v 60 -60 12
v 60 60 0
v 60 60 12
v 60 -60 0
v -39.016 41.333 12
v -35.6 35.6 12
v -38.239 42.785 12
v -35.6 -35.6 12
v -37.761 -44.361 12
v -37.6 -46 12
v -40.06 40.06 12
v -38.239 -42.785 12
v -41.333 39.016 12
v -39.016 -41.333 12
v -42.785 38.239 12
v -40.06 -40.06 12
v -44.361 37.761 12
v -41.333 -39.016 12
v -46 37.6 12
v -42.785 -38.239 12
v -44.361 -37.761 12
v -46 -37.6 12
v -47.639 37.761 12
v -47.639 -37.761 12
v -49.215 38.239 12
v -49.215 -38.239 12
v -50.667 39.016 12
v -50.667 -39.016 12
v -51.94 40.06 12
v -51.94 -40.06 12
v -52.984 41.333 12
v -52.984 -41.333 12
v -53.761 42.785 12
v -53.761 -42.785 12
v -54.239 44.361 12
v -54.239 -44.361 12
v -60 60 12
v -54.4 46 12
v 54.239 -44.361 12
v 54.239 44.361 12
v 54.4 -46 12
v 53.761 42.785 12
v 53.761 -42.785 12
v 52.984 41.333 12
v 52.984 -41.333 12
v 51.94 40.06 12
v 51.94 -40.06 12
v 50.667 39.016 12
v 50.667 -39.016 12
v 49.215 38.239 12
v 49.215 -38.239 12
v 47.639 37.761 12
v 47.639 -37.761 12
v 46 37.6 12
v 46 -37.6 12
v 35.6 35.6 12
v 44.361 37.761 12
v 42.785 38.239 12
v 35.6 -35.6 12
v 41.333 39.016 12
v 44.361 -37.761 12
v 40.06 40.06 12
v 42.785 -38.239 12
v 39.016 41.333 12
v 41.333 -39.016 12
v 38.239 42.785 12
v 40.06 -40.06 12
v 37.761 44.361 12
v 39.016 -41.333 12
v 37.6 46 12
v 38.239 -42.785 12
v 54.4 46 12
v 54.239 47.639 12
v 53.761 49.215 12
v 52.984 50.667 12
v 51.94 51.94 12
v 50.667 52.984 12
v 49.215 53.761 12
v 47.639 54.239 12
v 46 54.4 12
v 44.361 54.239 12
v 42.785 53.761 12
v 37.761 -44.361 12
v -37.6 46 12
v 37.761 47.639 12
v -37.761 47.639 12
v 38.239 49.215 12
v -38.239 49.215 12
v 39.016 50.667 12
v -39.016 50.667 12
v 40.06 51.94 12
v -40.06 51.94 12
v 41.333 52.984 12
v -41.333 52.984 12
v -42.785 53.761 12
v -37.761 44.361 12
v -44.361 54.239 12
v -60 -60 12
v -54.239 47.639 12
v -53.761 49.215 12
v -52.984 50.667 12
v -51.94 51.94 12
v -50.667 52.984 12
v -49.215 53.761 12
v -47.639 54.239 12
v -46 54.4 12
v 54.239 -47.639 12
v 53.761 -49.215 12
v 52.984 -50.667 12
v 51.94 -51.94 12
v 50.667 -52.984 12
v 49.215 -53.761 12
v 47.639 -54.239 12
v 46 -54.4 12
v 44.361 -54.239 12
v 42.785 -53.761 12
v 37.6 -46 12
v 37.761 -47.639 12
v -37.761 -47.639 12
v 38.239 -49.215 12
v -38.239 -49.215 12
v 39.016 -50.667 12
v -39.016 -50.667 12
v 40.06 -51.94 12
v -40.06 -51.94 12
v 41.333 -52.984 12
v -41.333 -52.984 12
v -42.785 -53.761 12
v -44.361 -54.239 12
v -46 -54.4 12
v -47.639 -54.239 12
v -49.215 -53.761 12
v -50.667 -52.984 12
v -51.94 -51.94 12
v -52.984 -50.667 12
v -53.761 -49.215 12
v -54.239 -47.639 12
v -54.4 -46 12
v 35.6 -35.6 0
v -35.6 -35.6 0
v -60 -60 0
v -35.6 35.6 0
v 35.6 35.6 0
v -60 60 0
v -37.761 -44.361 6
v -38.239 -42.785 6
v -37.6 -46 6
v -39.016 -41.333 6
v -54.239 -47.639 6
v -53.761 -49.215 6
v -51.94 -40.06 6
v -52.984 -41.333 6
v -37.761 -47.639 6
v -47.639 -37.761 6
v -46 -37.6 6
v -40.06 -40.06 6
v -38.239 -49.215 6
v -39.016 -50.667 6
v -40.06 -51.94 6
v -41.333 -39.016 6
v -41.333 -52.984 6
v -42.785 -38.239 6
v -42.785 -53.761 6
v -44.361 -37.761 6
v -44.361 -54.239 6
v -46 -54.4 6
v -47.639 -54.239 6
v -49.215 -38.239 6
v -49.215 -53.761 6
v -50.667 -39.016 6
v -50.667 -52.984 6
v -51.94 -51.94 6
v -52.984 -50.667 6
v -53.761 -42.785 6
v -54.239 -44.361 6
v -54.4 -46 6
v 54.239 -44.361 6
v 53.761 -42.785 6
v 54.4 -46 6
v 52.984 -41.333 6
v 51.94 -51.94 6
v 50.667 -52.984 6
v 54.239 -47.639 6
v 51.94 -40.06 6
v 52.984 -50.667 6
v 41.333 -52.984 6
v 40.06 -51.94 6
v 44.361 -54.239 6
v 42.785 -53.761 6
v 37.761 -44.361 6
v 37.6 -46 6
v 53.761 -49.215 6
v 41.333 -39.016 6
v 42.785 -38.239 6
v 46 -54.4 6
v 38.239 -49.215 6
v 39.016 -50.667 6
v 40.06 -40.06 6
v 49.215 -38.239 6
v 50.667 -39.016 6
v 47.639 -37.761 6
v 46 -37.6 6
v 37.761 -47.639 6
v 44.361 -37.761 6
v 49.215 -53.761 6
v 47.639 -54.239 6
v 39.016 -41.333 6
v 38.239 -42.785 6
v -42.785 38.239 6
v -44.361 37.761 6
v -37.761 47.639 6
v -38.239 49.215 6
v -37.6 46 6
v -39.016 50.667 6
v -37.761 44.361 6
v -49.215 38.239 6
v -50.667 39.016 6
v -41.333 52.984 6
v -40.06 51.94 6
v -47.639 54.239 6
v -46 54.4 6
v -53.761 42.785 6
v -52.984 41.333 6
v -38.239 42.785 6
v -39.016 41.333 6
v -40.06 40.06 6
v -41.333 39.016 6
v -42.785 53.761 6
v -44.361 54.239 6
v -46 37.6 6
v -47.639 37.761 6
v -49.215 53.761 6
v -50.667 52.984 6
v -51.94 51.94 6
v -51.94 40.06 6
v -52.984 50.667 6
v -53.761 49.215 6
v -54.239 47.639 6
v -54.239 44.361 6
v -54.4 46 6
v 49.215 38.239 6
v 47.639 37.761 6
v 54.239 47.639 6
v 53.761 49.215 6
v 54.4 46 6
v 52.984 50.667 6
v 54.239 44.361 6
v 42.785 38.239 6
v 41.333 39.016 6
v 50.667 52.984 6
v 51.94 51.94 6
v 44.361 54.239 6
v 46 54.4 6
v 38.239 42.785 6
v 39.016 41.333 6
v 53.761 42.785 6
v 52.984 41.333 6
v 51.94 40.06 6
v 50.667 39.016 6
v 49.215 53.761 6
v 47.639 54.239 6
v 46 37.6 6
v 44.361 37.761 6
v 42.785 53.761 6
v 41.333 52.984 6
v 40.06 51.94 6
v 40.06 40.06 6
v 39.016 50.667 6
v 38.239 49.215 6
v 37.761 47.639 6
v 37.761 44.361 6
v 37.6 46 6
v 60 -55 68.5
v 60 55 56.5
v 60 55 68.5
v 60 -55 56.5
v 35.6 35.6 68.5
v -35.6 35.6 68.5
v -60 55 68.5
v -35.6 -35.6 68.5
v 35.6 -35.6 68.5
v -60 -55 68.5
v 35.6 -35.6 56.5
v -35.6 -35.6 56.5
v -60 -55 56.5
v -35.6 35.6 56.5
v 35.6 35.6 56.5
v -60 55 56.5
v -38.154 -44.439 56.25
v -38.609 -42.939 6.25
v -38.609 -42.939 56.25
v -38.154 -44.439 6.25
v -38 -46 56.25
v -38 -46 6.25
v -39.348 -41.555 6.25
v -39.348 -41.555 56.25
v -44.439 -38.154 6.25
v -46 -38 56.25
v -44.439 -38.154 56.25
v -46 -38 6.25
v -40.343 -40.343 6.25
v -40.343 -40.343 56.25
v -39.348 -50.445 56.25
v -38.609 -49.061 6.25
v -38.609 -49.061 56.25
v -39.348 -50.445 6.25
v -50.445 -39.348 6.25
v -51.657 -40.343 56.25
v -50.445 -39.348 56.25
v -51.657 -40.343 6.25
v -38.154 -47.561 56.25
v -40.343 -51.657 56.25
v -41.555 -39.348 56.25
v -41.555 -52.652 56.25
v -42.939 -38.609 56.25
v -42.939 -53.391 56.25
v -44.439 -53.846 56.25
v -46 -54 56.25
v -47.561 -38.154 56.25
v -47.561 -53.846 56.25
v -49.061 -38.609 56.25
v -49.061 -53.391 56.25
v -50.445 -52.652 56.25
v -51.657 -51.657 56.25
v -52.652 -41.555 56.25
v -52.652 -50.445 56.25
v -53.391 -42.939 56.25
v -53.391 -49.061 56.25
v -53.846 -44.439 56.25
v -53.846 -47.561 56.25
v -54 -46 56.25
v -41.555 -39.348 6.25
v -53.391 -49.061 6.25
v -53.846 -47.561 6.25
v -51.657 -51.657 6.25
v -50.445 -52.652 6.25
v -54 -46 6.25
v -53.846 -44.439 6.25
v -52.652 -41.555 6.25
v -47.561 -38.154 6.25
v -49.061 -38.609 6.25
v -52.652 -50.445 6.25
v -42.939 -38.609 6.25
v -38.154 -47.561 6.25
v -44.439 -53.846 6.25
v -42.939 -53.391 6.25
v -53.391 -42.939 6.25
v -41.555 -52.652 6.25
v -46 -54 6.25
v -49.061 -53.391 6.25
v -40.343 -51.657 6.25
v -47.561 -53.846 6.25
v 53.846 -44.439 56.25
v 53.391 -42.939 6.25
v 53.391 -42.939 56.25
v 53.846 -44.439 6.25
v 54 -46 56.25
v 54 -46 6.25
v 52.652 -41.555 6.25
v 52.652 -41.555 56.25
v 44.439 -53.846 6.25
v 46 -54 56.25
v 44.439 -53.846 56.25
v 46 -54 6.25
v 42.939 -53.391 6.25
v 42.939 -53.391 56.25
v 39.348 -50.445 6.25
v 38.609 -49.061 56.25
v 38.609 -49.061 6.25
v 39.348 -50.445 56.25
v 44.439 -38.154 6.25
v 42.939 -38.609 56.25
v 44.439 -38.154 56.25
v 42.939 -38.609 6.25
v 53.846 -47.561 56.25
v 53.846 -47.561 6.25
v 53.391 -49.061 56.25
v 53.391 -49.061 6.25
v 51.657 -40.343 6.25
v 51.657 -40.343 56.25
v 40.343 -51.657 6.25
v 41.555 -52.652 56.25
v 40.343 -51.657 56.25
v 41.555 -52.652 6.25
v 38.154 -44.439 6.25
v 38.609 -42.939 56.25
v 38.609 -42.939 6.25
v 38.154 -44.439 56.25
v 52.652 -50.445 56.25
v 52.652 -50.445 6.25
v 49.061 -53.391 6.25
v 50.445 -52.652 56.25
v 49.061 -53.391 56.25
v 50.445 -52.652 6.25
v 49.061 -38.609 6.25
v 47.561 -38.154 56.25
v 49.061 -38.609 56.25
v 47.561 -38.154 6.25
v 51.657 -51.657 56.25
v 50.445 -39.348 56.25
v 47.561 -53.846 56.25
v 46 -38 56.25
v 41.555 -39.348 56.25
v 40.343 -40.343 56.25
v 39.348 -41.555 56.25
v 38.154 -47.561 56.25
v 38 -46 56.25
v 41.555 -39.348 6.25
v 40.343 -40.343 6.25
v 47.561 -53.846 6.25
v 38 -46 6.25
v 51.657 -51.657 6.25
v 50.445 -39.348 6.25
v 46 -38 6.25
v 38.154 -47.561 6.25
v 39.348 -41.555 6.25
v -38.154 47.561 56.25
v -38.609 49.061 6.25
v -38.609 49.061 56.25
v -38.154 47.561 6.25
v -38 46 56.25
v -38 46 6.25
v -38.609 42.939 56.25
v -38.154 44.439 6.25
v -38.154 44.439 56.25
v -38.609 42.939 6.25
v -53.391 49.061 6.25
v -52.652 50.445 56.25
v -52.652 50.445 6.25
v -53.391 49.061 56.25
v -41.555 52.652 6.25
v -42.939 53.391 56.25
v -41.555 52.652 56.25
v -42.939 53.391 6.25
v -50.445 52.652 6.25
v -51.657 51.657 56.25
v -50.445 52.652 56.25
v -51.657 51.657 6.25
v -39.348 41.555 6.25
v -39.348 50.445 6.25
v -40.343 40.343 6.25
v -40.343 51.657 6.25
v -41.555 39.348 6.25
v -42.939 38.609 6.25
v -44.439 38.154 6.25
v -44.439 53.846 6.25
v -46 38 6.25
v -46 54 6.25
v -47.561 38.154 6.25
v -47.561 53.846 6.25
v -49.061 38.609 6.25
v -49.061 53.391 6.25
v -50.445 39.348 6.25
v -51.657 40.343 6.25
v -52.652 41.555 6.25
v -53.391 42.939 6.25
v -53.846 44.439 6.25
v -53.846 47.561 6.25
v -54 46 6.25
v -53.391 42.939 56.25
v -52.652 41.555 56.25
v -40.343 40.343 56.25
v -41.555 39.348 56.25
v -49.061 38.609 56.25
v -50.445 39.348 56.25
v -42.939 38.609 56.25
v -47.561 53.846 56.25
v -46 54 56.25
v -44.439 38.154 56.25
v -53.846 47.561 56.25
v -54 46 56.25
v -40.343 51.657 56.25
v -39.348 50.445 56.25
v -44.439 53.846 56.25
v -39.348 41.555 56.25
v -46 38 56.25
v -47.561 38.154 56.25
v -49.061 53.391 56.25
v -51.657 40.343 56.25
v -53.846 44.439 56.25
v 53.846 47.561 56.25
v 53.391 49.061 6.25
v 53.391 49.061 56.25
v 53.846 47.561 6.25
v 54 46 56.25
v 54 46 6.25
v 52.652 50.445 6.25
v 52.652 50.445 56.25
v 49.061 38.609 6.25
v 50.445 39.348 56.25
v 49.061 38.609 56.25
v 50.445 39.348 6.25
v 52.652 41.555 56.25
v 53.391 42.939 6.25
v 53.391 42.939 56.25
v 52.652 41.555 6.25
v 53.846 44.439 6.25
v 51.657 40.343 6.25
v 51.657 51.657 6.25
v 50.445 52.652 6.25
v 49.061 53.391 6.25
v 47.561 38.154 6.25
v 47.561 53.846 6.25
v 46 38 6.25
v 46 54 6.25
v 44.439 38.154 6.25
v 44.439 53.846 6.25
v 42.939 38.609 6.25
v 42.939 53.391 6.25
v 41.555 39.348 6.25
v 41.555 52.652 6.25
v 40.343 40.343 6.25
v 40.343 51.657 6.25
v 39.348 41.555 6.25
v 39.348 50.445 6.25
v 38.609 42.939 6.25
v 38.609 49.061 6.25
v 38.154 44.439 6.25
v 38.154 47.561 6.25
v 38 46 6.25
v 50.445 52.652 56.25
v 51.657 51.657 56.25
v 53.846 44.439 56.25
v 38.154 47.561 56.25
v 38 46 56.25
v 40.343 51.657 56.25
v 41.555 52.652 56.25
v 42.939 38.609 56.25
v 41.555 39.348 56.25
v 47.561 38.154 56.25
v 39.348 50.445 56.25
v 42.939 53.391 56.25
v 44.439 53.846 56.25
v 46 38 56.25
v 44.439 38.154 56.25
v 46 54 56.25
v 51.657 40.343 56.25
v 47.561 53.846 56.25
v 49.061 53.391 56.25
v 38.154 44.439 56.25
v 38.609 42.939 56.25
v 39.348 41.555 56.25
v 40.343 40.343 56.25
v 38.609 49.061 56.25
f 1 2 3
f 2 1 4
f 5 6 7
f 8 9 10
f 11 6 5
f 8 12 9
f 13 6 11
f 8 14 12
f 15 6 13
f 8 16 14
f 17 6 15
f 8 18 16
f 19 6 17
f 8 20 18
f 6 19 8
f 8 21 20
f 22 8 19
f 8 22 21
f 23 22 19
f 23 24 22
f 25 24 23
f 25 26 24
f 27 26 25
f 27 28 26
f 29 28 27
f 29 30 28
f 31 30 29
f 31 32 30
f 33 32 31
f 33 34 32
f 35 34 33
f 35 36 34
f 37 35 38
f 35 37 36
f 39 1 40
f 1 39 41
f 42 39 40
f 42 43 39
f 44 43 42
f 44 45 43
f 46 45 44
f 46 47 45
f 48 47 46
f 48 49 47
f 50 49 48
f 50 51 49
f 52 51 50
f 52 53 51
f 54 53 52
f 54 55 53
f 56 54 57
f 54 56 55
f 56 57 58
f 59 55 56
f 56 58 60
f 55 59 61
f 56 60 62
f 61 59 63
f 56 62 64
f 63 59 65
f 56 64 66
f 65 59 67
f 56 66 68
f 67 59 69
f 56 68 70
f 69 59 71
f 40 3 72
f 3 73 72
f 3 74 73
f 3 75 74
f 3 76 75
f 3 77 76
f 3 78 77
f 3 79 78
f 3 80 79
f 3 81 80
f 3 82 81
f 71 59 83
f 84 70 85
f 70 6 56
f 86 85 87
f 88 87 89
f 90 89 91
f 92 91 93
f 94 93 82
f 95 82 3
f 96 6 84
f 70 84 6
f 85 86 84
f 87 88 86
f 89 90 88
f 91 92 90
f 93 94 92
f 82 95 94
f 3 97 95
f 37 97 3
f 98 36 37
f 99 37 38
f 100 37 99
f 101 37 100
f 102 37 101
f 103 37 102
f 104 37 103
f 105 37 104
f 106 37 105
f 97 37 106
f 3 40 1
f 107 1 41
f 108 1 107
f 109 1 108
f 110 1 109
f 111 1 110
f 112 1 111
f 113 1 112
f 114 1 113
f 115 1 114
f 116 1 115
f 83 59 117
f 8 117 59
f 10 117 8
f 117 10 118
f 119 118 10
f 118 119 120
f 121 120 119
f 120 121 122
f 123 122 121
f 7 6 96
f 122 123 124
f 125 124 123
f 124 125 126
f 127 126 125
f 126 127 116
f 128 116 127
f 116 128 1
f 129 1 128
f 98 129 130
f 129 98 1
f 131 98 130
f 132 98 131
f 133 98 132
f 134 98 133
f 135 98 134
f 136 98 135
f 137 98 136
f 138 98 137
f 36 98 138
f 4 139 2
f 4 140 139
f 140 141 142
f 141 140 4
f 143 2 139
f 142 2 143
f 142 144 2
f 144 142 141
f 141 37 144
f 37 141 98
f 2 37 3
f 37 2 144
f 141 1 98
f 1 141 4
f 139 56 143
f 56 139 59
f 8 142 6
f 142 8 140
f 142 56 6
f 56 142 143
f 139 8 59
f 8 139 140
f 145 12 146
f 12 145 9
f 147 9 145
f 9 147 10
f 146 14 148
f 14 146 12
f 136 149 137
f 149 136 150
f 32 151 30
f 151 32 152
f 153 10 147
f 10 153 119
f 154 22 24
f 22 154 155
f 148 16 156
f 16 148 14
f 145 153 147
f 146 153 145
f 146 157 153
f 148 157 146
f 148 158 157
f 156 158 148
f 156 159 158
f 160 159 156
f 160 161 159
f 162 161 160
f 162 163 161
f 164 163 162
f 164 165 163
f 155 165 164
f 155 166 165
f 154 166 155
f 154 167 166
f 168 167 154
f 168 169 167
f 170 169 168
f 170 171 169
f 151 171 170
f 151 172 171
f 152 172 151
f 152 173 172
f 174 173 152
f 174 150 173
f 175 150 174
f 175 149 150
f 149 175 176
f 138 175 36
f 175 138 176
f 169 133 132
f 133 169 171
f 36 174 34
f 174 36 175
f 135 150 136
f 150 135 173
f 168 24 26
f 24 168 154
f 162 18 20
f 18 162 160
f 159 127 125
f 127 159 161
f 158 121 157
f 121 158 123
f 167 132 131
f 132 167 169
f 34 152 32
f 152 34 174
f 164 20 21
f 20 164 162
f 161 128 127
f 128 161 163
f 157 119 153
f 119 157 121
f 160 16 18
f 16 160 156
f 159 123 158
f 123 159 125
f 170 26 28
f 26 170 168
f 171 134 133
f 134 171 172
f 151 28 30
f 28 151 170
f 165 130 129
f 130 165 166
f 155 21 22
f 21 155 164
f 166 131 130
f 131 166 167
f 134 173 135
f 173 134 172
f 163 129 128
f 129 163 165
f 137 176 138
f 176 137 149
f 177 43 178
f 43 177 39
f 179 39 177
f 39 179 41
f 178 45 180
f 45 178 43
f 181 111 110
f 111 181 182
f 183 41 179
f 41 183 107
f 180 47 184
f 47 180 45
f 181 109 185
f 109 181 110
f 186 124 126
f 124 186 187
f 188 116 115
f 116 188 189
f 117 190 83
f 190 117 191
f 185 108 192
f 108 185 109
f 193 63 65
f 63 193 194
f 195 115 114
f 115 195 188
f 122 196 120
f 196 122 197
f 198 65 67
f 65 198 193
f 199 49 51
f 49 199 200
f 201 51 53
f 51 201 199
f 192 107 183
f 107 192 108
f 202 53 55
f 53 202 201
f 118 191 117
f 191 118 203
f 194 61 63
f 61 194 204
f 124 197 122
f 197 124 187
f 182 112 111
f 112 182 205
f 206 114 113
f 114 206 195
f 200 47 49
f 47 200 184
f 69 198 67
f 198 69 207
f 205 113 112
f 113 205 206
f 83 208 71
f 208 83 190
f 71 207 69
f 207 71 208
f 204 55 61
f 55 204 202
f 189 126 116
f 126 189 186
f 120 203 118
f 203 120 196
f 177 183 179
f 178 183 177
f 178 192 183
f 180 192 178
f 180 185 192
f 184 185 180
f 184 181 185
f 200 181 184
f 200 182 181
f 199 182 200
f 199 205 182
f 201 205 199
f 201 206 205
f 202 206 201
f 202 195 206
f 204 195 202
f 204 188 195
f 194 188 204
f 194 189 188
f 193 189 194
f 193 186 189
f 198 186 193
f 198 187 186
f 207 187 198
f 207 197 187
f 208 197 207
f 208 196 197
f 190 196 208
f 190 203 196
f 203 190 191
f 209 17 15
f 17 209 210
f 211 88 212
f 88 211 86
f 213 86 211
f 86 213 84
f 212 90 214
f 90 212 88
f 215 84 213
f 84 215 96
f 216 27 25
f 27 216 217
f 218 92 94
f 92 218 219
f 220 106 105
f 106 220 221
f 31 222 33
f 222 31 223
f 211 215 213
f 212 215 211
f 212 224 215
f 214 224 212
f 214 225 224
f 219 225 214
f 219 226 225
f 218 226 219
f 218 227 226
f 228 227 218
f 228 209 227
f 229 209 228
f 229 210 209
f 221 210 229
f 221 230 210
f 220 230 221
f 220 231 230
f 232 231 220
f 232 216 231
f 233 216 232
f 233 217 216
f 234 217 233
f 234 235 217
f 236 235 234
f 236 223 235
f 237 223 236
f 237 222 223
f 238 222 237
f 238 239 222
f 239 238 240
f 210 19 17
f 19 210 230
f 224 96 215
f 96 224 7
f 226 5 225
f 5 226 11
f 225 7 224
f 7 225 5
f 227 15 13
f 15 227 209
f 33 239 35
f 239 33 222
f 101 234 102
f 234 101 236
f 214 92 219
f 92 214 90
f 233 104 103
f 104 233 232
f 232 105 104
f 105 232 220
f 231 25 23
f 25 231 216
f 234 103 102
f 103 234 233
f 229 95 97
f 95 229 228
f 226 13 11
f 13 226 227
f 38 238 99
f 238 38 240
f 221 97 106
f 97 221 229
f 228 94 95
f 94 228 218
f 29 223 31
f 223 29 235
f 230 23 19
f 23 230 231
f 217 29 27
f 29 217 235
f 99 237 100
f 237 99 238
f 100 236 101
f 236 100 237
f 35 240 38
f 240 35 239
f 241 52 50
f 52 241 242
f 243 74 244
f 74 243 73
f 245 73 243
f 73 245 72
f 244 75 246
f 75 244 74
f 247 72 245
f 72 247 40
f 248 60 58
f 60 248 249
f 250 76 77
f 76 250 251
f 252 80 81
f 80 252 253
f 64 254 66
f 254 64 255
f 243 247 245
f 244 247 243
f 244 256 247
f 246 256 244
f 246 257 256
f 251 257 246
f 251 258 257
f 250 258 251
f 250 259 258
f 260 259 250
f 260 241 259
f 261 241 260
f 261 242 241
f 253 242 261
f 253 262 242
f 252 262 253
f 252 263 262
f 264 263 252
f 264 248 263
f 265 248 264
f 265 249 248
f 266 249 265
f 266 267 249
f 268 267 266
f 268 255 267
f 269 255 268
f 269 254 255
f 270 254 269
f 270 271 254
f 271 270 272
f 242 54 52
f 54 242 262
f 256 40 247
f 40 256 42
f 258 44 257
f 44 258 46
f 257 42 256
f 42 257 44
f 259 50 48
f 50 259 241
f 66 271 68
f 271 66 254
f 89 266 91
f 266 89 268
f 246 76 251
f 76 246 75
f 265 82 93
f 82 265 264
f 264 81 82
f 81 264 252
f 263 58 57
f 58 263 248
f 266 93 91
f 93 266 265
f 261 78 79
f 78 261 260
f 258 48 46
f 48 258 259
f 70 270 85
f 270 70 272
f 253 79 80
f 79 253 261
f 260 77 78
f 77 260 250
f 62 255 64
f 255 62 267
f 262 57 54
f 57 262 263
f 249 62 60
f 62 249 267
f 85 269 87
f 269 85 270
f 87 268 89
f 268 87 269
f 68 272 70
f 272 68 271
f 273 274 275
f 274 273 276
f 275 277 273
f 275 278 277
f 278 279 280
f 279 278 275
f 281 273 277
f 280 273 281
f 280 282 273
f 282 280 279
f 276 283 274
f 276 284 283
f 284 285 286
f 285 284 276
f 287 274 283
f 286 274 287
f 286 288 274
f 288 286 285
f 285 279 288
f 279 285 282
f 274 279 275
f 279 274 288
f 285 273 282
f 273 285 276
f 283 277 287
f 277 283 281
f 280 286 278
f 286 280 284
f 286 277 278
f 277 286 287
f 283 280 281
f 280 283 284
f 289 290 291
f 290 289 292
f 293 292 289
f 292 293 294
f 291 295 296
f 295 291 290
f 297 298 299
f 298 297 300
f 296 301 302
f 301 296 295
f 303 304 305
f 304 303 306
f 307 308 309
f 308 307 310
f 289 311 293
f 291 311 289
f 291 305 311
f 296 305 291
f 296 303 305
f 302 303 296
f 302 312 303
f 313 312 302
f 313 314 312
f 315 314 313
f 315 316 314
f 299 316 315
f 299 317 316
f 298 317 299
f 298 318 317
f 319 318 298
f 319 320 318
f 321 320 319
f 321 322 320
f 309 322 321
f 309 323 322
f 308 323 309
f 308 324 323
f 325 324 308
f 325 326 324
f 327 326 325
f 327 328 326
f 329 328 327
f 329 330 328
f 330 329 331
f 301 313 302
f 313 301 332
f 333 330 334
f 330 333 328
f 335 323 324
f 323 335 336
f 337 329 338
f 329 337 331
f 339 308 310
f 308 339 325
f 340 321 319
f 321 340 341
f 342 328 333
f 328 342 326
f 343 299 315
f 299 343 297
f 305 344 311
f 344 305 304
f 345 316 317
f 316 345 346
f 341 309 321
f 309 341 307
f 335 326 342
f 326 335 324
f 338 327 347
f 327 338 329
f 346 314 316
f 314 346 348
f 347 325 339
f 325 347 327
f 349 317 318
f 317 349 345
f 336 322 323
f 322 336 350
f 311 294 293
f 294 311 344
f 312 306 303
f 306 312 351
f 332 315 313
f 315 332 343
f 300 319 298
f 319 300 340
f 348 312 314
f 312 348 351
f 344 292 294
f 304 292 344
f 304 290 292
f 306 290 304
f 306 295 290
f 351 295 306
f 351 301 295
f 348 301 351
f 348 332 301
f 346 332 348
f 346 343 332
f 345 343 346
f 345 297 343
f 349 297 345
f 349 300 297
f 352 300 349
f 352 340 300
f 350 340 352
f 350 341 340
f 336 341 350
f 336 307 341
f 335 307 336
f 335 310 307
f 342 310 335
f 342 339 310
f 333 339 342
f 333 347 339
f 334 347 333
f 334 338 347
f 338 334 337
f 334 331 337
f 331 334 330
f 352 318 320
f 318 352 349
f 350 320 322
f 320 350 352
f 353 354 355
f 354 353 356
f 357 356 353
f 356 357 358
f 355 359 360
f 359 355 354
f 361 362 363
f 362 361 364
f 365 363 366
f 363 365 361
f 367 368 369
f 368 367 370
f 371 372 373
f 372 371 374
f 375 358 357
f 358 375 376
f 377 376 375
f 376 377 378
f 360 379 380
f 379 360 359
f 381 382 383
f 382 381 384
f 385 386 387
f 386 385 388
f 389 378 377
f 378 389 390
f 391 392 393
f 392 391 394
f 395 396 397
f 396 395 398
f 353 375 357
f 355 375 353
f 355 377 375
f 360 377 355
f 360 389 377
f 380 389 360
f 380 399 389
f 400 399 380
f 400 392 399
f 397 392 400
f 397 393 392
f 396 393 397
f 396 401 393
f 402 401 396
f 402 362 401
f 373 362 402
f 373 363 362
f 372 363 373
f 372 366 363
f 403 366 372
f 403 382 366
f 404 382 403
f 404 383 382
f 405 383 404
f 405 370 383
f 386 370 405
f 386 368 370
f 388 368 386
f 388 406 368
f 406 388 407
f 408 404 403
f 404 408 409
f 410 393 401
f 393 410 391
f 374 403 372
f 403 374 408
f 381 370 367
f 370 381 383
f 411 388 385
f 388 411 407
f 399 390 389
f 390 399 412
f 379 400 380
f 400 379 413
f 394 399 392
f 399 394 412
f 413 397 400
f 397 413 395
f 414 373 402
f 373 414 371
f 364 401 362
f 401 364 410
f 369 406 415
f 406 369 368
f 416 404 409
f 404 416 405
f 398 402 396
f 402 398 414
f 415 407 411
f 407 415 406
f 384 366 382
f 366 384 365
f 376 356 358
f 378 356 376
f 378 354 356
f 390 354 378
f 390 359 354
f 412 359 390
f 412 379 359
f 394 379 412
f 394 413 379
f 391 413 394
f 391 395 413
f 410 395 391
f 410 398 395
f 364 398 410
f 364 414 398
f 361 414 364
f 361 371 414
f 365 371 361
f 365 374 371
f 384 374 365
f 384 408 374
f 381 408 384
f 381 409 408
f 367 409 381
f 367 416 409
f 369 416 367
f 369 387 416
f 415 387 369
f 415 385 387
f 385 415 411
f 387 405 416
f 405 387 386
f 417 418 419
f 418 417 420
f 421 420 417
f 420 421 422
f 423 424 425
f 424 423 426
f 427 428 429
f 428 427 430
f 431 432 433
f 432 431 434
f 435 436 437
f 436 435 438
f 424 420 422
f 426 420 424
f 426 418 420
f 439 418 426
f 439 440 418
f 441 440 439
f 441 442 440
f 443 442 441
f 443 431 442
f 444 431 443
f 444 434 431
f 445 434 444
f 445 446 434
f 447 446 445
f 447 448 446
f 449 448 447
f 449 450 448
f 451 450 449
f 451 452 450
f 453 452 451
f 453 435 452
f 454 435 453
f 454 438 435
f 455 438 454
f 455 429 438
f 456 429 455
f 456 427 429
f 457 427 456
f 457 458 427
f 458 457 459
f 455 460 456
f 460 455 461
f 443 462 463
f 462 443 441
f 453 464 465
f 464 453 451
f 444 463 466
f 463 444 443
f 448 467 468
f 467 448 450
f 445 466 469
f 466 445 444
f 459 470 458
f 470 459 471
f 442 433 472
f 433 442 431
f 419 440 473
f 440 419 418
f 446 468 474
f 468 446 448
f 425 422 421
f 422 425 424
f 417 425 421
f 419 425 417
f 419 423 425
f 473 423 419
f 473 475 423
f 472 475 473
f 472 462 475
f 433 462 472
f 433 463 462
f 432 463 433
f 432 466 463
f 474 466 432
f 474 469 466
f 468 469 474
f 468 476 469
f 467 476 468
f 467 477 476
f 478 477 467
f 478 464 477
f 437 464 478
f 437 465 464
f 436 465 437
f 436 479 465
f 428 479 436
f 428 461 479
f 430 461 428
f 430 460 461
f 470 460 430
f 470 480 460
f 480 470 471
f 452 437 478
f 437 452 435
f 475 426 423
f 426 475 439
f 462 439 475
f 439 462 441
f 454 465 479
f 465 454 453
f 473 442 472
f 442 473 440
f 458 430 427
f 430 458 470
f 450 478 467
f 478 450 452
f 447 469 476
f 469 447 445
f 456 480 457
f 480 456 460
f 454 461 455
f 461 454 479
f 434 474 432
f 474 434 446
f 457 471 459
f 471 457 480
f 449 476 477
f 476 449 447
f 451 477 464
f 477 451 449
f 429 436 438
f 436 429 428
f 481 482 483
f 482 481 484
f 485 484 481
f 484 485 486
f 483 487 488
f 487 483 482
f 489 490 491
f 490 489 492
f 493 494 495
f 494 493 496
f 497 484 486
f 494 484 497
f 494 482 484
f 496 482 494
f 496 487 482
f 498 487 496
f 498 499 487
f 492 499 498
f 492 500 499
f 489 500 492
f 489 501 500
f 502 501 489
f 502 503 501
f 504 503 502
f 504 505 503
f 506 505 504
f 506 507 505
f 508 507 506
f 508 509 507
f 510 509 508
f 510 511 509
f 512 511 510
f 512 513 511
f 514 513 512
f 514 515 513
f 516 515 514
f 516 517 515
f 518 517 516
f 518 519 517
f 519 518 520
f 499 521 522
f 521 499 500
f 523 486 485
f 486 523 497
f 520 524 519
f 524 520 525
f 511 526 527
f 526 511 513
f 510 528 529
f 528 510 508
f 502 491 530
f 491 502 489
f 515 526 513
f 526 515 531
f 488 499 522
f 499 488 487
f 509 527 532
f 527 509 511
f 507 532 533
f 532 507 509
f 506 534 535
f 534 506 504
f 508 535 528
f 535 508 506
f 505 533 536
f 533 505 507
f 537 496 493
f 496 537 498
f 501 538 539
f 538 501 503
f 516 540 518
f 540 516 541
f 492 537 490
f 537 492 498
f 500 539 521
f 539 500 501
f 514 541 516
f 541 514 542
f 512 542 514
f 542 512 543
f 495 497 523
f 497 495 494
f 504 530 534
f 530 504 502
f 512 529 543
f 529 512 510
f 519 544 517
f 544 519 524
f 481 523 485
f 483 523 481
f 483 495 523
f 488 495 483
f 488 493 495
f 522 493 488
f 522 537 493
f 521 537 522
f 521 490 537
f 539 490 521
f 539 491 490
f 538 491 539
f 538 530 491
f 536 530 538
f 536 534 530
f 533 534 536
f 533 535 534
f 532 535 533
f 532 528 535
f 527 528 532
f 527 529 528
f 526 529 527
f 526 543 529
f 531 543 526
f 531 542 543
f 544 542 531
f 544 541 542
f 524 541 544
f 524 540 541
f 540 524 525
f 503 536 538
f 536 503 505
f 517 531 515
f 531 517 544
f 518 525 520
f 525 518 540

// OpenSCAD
$fn = 32;

// ------------------------------------------------------------------------
// Frame cube: base 120 x 120 mm, posts 50 mm tall
// Every part is its own module, assembly() places every instance.
// ------------------------------------------------------------------------

// --- part 1 ---
module base_frame() {
  difference() {
    translate([-60, -60, 0]) cube([120, 120, 12]);
    translate([-35.6, -35.6, -1]) cube([71.2, 71.2, 14]);
    translate([-46, -46, 6]) cylinder(h = 7, d = 16.8);
    translate([46, -46, 6]) cylinder(h = 7, d = 16.8);
    translate([-46, 46, 6]) cylinder(h = 7, d = 16.8);
    translate([46, 46, 6]) cylinder(h = 7, d = 16.8);
  }
}

// --- part 2 ---
module corner_post() {
  cylinder(h = 50, d = 16);
}

// --- part 3 ---
module top_frame() {
  difference() {
    translate([-60, -55, 0]) cube([120, 110, 12]);
    translate([-35.6, -35.6, -1]) cube([71.2, 71.2, 14]);
  }
}

// --- assembly ---
module assembly() {
  color([0.80, 0.24, 0.20]) translate([0, 0, 0]) rotate([0, 0, 0]) base_frame();
  color([0.20, 0.45, 0.75]) translate([-46, -46, 6.25]) rotate([0, 0, 0]) corner_post();
  color([0.25, 0.62, 0.32]) translate([46, -46, 6.25]) rotate([0, 0, 0]) corner_post();
  color([0.92, 0.70, 0.18]) translate([-46, 46, 6.25]) rotate([0, 0, 0]) corner_post();
  color([0.58, 0.35, 0.70]) translate([46, 46, 6.25]) rotate([0, 0, 0]) corner_post();
  color([0.16, 0.66, 0.66]) translate([0, 0, 56.5]) rotate([0, 0, 0]) top_frame();
}

assembly();
